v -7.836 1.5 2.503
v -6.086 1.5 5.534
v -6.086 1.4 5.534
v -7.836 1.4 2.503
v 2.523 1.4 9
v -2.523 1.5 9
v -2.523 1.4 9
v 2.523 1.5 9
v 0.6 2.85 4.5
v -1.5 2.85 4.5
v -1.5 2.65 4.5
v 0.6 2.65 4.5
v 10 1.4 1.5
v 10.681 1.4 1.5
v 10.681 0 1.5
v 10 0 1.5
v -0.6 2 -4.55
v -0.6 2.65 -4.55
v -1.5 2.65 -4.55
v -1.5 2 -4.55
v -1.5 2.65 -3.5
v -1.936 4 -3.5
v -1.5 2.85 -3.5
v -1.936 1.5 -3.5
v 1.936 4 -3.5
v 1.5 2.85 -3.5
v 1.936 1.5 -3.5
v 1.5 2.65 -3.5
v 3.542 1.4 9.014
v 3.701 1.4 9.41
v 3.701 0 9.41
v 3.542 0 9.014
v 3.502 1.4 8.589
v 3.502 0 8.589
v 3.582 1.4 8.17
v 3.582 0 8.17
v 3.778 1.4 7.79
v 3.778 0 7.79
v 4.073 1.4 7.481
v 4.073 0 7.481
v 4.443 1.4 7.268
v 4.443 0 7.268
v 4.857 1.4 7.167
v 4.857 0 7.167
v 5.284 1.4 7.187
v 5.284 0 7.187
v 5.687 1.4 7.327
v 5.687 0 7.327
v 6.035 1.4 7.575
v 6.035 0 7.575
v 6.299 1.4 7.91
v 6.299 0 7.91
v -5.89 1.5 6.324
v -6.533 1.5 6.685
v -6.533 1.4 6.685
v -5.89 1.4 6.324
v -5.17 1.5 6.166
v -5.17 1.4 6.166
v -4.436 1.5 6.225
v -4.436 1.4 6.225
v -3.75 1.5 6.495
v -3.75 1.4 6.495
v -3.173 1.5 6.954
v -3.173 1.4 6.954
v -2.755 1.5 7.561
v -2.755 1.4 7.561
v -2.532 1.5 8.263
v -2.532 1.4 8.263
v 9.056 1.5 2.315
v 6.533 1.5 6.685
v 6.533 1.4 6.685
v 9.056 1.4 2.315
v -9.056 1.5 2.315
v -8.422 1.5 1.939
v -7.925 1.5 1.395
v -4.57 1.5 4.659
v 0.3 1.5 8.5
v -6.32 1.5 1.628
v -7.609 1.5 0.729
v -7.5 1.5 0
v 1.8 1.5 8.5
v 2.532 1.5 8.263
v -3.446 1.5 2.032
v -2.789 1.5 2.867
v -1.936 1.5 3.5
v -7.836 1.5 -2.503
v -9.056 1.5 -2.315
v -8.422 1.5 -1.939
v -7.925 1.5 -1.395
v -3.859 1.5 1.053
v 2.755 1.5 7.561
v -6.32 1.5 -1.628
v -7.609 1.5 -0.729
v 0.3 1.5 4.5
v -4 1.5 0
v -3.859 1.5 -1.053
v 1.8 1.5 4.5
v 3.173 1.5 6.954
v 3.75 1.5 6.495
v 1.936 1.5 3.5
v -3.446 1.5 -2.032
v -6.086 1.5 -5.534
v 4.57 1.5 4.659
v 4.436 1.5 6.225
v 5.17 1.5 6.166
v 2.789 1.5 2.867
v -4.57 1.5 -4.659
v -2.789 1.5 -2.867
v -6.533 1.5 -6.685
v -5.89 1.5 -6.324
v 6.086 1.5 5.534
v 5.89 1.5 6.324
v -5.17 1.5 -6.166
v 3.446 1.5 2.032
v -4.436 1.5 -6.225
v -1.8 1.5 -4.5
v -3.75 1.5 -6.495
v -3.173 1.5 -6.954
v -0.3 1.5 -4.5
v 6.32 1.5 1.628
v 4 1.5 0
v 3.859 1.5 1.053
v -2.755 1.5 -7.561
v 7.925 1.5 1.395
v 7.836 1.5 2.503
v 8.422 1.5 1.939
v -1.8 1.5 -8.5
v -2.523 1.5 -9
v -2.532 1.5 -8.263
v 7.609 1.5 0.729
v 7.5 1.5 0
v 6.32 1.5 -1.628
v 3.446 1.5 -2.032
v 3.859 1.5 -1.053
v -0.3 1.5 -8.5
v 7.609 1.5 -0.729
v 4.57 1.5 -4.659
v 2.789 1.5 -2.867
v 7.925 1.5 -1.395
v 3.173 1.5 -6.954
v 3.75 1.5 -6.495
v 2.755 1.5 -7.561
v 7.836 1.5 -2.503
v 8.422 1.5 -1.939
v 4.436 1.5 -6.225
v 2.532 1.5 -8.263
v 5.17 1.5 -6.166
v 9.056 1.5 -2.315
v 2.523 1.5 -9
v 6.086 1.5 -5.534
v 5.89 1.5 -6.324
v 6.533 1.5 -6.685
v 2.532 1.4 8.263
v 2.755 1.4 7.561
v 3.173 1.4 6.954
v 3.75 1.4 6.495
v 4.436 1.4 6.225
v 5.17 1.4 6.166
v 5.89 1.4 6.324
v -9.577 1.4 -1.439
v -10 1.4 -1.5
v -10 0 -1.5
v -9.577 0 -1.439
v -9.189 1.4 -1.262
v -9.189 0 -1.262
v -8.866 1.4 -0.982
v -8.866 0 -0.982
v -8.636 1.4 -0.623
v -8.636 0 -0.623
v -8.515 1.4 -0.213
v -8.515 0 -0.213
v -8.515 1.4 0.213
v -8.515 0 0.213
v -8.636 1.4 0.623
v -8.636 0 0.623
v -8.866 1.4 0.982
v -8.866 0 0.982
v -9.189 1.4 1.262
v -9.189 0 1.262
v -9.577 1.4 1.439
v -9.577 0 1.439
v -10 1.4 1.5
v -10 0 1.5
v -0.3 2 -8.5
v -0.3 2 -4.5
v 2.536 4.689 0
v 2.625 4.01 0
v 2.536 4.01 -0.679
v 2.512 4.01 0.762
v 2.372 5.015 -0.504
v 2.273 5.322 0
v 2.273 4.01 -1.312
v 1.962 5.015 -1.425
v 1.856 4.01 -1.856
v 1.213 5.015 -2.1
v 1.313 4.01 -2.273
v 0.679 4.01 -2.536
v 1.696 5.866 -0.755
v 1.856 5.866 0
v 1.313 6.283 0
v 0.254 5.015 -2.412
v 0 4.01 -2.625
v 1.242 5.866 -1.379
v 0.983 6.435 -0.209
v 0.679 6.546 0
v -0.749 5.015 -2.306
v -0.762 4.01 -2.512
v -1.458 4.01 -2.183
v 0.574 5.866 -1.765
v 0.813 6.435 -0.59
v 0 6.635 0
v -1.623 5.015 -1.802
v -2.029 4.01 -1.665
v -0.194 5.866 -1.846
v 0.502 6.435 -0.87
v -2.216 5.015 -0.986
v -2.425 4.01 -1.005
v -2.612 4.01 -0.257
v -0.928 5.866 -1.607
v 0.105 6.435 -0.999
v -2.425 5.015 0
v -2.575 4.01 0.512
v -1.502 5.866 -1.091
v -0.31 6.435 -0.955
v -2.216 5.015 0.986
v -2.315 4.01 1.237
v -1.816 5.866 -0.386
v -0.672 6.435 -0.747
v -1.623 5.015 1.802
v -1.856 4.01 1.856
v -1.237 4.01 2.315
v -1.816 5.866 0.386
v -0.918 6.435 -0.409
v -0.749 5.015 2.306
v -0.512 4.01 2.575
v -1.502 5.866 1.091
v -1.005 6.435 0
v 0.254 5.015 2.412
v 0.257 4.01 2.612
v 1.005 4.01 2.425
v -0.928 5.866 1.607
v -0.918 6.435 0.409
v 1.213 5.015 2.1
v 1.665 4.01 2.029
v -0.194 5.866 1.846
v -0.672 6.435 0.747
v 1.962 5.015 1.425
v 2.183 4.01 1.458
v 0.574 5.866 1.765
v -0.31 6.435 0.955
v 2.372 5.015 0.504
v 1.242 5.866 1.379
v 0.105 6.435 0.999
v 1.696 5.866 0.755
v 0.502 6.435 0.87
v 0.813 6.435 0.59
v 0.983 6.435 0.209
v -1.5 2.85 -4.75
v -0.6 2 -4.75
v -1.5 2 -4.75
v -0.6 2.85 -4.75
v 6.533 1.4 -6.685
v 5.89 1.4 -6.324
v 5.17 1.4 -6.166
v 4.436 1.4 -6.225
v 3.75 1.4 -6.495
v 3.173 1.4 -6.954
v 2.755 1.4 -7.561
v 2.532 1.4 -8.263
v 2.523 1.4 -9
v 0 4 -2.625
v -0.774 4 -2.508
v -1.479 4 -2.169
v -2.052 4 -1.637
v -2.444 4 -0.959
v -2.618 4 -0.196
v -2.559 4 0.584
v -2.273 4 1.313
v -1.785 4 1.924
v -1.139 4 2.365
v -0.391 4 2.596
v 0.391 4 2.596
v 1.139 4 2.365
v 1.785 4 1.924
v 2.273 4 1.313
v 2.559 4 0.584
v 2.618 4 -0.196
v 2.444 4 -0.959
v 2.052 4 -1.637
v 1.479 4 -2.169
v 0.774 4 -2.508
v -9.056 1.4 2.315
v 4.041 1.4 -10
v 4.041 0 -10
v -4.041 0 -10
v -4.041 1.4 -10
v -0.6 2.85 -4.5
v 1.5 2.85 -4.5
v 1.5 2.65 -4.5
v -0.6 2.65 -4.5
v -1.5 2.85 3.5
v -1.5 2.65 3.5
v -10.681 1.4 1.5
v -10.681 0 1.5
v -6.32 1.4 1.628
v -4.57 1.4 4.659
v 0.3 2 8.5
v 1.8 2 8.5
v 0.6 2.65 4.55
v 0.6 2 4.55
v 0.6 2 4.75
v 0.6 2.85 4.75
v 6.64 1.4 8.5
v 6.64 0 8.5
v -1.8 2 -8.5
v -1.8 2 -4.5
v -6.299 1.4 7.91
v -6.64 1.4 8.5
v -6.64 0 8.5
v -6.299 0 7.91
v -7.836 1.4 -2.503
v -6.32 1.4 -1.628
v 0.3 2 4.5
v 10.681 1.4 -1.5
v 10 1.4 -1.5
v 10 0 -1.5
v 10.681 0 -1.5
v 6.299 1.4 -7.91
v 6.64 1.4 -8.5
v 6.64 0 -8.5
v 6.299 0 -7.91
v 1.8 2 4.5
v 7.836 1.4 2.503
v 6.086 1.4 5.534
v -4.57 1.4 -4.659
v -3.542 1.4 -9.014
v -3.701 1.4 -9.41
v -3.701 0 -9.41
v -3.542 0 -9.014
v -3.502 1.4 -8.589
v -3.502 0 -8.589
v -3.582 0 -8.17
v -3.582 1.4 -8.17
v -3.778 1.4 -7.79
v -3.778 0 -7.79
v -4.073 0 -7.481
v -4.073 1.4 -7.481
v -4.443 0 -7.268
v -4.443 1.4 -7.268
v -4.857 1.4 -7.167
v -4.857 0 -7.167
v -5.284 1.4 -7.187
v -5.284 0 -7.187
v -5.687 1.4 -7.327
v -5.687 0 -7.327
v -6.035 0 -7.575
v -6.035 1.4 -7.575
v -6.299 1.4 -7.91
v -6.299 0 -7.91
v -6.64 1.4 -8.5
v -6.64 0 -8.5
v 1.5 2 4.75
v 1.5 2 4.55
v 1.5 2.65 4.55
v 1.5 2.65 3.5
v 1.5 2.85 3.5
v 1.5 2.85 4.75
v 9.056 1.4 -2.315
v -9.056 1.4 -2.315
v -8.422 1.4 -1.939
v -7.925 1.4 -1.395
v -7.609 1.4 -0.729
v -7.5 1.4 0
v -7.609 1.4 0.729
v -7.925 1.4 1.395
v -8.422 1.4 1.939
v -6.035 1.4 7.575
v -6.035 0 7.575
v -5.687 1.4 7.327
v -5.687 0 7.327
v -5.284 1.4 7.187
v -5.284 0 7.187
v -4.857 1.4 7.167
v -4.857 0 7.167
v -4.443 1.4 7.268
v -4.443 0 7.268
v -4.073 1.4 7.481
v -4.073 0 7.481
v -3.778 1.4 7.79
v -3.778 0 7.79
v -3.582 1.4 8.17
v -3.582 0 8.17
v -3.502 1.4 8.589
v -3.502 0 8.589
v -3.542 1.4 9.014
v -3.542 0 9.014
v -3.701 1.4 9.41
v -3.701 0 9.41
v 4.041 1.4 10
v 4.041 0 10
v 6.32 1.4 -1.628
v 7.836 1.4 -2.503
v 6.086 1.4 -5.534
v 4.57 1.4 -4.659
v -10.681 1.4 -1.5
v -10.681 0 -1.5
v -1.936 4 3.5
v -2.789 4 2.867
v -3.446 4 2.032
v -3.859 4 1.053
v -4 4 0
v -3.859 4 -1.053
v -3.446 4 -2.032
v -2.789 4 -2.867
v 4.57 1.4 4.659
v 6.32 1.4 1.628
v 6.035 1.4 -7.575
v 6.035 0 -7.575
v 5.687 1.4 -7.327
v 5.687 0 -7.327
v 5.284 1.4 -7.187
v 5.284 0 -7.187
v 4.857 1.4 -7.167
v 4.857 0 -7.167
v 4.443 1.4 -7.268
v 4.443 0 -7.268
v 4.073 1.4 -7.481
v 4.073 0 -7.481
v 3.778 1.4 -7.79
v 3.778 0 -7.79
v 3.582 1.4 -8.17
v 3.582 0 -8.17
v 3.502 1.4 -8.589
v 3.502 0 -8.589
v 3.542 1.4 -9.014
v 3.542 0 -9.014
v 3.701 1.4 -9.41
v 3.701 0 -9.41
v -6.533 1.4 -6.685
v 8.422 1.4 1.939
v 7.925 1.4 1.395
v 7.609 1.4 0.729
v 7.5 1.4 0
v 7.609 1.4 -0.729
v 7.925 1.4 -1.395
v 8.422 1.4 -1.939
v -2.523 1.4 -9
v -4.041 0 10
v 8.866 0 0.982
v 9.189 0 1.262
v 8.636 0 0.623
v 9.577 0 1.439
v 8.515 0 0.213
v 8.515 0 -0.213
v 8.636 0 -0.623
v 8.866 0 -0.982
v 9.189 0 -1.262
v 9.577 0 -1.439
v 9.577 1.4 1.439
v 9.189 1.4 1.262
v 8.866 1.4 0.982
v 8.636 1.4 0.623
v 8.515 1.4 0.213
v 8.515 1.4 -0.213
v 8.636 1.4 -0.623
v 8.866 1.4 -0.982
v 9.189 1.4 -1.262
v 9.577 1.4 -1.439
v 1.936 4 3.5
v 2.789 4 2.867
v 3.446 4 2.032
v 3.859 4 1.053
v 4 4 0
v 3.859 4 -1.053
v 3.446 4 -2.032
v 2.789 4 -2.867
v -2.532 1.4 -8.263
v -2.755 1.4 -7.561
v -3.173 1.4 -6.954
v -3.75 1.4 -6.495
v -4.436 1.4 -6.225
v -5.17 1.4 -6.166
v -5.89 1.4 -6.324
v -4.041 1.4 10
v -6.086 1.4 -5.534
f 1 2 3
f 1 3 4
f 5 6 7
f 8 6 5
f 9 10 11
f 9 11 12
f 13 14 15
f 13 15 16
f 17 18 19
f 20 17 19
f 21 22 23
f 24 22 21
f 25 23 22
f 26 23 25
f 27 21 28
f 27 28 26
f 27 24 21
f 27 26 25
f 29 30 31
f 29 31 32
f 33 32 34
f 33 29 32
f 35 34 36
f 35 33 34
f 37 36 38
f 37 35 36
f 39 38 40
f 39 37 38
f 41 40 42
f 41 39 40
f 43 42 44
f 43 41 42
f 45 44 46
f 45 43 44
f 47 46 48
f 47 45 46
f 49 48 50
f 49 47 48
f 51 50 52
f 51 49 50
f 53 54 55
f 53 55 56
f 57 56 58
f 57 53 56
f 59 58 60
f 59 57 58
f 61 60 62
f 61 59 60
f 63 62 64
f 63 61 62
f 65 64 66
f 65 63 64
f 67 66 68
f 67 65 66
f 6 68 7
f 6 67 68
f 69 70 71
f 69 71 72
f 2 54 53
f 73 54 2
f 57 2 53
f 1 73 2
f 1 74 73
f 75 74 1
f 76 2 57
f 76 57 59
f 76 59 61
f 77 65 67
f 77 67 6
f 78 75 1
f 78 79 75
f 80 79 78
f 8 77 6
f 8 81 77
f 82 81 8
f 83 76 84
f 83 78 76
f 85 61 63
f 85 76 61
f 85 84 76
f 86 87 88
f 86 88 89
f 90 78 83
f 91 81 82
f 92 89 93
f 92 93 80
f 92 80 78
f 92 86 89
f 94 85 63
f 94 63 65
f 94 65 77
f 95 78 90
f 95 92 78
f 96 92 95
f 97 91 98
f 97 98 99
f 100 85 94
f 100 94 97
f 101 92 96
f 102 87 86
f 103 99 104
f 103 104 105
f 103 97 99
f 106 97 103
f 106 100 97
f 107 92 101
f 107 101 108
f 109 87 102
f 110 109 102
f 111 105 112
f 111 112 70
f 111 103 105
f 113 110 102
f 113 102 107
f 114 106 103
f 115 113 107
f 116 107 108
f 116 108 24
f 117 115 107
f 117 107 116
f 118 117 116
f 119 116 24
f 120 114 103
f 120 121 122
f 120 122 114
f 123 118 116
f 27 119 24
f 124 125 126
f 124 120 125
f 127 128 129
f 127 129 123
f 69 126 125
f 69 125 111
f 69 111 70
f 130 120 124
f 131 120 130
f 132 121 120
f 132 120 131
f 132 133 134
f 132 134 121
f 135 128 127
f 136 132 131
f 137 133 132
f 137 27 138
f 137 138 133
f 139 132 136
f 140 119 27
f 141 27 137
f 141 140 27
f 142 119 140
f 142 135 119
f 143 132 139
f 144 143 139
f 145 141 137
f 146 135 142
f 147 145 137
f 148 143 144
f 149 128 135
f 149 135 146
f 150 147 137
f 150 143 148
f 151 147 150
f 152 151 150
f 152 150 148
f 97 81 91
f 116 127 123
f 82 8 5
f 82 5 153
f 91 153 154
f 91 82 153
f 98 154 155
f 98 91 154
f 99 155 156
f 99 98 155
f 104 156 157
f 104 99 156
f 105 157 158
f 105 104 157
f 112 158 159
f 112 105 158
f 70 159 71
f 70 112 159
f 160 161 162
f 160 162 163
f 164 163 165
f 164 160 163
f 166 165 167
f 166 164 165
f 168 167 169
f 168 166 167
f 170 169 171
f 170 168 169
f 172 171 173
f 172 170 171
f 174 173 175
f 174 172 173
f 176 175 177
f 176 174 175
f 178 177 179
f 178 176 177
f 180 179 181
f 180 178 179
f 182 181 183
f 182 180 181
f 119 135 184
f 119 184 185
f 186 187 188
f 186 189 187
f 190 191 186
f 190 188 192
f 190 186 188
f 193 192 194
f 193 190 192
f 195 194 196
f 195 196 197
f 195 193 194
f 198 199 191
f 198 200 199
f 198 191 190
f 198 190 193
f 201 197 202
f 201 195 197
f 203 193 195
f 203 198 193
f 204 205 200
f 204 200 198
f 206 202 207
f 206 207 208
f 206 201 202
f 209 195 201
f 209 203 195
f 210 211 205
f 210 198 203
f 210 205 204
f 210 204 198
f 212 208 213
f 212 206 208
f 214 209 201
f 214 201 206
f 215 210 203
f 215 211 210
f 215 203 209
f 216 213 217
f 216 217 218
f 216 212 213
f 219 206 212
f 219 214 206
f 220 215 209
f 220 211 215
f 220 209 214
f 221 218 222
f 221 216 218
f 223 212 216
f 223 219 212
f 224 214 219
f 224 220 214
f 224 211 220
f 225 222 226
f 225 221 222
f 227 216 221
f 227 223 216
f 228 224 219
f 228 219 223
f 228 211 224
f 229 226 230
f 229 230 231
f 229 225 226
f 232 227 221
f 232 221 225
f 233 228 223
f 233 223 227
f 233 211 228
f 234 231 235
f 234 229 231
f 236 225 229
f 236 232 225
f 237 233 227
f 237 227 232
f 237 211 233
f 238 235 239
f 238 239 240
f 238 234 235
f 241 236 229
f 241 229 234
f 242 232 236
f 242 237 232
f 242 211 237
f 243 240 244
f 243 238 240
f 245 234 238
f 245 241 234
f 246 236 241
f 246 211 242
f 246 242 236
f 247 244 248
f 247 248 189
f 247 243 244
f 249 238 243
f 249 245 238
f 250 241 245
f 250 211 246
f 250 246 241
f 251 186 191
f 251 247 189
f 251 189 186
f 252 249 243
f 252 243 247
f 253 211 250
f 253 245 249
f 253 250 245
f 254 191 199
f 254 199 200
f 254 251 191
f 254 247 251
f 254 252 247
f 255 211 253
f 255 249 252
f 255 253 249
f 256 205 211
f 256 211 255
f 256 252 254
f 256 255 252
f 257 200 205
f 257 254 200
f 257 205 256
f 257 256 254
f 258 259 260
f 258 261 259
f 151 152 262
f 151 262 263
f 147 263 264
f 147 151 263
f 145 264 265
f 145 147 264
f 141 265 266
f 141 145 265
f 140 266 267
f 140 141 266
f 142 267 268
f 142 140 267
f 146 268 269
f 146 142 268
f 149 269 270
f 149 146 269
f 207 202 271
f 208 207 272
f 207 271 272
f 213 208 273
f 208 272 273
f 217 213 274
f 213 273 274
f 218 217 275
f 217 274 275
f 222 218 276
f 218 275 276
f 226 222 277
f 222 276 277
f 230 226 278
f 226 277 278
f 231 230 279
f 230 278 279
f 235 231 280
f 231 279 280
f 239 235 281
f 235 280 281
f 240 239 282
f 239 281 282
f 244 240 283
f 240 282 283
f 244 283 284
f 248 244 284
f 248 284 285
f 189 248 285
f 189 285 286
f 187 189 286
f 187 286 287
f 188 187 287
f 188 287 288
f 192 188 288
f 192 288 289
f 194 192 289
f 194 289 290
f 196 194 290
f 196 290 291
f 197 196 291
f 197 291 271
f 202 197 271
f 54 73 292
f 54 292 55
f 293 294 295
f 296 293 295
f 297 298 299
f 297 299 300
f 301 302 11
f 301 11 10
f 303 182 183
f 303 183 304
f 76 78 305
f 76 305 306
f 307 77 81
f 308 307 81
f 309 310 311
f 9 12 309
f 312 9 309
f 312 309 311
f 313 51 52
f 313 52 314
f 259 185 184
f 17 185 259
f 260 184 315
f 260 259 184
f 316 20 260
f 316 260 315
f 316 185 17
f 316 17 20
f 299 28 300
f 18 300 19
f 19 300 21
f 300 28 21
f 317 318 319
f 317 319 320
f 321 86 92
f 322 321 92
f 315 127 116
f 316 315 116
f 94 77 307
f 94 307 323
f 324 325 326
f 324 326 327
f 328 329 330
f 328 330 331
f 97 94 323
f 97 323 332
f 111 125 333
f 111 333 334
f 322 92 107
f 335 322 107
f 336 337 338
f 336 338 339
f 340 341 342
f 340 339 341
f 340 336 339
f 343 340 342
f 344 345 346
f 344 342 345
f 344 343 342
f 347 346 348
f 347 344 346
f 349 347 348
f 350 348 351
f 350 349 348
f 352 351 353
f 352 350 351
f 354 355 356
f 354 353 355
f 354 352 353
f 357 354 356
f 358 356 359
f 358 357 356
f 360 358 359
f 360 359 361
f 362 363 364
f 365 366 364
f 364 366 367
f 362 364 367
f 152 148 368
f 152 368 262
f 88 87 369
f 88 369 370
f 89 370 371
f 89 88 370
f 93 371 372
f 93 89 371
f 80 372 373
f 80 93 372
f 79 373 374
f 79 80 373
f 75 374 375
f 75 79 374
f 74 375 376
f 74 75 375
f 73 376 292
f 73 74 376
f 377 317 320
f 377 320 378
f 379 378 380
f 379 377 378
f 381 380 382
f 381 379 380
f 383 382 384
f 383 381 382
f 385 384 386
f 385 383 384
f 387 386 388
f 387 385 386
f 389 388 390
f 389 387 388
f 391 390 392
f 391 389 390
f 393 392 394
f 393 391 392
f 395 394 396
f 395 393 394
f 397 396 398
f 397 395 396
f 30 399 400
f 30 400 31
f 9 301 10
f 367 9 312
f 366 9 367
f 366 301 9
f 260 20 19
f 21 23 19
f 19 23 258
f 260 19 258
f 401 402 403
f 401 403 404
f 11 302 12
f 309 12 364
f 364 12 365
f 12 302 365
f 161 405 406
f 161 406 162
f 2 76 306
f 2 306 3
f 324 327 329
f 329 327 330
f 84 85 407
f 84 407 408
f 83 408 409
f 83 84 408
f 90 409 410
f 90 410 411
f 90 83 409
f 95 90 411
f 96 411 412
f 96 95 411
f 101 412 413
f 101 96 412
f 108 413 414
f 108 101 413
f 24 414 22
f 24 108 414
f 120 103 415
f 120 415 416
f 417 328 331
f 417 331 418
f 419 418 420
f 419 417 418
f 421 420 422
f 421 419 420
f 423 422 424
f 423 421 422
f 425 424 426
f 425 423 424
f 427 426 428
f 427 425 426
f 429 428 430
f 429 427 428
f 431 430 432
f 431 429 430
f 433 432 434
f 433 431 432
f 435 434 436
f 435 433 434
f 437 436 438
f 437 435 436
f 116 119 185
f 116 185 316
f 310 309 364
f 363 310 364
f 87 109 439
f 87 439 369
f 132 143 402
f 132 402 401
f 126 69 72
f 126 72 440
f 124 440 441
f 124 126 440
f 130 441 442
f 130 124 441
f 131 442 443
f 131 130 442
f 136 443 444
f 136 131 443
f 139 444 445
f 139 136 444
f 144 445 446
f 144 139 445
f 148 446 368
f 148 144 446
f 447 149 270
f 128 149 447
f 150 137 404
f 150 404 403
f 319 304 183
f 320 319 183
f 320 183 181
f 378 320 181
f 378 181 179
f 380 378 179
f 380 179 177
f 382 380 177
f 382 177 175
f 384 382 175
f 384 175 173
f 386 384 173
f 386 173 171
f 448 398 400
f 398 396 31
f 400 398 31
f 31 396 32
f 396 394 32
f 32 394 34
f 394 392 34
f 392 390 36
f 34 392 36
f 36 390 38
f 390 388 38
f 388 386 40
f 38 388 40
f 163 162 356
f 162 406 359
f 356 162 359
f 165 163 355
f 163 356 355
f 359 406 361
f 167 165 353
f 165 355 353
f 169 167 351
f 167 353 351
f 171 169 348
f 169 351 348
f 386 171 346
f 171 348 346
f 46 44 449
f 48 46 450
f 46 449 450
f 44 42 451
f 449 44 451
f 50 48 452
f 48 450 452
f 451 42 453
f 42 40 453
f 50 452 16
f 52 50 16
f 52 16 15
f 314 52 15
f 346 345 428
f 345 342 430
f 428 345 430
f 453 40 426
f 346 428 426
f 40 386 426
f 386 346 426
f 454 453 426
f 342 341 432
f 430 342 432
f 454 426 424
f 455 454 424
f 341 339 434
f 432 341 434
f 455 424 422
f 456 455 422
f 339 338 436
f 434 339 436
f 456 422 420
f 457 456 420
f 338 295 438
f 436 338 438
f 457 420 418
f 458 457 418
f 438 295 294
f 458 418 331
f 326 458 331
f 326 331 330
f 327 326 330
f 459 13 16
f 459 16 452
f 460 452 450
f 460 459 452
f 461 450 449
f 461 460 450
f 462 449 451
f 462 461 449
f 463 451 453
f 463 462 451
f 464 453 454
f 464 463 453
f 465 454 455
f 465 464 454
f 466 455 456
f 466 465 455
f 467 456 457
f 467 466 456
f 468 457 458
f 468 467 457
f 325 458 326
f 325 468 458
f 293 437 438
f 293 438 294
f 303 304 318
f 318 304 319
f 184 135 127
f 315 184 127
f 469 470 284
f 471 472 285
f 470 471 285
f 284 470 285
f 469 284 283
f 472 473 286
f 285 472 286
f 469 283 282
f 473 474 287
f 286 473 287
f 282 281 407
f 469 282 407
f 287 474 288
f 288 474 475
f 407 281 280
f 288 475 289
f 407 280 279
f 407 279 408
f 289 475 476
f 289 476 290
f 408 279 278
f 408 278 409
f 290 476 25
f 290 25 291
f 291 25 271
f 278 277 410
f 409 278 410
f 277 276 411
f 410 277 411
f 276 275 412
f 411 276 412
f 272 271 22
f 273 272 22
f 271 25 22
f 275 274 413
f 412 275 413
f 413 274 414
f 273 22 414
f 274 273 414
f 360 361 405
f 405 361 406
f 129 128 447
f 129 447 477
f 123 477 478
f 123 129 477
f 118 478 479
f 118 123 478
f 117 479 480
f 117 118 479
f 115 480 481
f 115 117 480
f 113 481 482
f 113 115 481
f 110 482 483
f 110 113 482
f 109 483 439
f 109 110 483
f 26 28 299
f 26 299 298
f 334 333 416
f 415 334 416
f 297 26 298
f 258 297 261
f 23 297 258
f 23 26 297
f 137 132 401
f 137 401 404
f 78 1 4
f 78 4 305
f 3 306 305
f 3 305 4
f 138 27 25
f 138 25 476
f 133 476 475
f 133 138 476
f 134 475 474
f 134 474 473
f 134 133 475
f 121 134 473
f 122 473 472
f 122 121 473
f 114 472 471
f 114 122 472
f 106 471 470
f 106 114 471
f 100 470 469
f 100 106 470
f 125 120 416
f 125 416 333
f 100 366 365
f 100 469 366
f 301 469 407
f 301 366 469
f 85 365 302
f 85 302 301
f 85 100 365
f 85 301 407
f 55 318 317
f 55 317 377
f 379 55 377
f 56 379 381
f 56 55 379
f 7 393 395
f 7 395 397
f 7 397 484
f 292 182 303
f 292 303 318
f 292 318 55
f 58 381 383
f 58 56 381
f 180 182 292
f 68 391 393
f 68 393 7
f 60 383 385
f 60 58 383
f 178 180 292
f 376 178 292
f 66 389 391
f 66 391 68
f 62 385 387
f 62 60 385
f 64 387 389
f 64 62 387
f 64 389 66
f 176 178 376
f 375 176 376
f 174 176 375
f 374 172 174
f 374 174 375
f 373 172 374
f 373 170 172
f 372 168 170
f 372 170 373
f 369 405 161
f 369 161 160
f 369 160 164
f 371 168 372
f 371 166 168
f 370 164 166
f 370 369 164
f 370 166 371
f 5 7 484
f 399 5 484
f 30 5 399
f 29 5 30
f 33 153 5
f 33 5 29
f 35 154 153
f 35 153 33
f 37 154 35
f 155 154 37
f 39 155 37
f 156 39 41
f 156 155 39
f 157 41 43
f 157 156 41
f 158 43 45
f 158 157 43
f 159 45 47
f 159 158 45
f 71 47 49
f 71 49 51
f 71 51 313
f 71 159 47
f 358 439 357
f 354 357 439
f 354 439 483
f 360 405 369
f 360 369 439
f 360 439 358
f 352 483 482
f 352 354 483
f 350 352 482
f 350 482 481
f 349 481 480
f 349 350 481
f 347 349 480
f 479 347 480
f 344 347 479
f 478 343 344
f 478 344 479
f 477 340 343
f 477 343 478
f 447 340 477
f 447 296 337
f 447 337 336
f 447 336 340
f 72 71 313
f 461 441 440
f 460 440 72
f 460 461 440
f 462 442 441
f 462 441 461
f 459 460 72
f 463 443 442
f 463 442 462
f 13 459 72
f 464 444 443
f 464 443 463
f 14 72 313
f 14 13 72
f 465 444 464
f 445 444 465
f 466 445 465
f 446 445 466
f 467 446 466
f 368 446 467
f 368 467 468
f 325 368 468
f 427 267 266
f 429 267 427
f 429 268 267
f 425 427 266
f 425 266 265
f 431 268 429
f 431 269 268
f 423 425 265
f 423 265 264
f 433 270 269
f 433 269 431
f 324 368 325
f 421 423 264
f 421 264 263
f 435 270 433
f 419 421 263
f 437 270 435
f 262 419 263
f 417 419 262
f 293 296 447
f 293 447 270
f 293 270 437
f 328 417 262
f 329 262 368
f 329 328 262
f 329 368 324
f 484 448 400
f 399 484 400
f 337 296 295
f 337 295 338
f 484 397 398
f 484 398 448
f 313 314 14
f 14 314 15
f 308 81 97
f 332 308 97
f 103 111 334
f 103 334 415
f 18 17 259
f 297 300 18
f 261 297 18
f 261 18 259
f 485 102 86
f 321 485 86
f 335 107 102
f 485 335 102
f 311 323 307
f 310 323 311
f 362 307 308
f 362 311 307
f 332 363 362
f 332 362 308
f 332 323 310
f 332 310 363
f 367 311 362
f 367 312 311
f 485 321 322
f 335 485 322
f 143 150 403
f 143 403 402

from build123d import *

# Parameters (mm, degrees)
BOSS_EXTRUDE1_DEPTH = 1.5
BOSS_EXTRUDE2_DEPTH = 2.5
SKETCH3_R           = 2.625
BOSS_EXTRUDE3_DEPTH = 0.01
SKETCH4_W           = 3
SKETCH4_H           = 0.2
BOSS_EXTRUDE4_DEPTH = 1
SKETCH5_W           = 0.9
SKETCH5_H           = 0.2
BOSS_EXTRUDE5_DEPTH = 0.25
BOSS_EXTRUDE6_REACH = 17.786
SKETCH6_W           = 0.9
SKETCH6_H           = 0.2
SKETCH8_W           = 1.5
SKETCH8_H           = 4
BOSS_EXTRUDE7_DEPTH = 0.5
CIRPATTERN1_COUNT   = 2
CUT_EXTRUDE1_DEPTH  = 17.115258556
CIRPATTERN2_COUNT   = 6
CUT_EXTRUDE2_DEPTH  = 0.1


# Read off the part's stored shape, not the designer's step: Dome1
with BuildPart() as part:
    # Sketch1 → Boss-Extrude1 (new body)
    with BuildSketch(Plane(origin=(0, 0, 0), x_dir=(1, 0, 0), z_dir=(0, 1, 0))):
        Polygon((-11.547005384, 0), (-5.773502692, -10), (5.773502692, -10), (11.547005384, 0), (5.773502692, 10), (-5.773502692, 10), align=None)
    extrude(amount=BOSS_EXTRUDE1_DEPTH)

    # Sketch2 → Boss-Extrude2 (add)
    with BuildSketch(Plane(origin=(0, 1.5, 0), x_dir=(1, 0, 0), z_dir=(0, 1, 0))):
        with BuildLine():
            Line((-1.936491673, 3.5), (1.936491673, 3.5))
            ThreePointArc((1.936491673, 3.5), (4, 0), (1.936491673, -3.5))
            Line((1.936491673, -3.5), (-1.936491673, -3.5))
            ThreePointArc((-1.936491673, -3.5), (-4, 0), (-1.936491673, 3.5))
        make_face()
    extrude(amount=BOSS_EXTRUDE2_DEPTH)

    # Sketch3 → Boss-Extrude3 (add)
    with BuildSketch(Plane(origin=(0, 4, 0), x_dir=(1, 0, 0), z_dir=(0, 1, 0))):
        with Locations(Location((0, 0, 0), (0, 0, 90))):
            Circle(SKETCH3_R)
    extrude(amount=BOSS_EXTRUDE3_DEPTH)

    # Dome1 outline → Dome1 (revolve)
    with BuildSketch(Plane.XY):
        with BuildLine():
            Line((0, 4.01), (2.625, 4.009999997))
            ThreePointArc((2.625, 4.009999997), (1.856155302, 5.8661553), (0, 6.635))
            Line((0, 6.635), (0, 4.01))
        make_face()
    revolve(axis=Axis((0, 0, 0), (0, 1, 0)))

    # Sketch4 → Boss-Extrude4 (add)
    with BuildSketch(Plane.XY.offset(3.5)):
        with Locations((0, 2.75)):
            Rectangle(SKETCH4_W, SKETCH4_H)
    boss_extrude4 = extrude(amount=BOSS_EXTRUDE4_DEPTH)

    # Sketch5 → Boss-Extrude5 (add)
    with BuildSketch(Plane.XY.offset(4.5)):
        with Locations((1.05, 2.75)):
            Rectangle(SKETCH5_W, SKETCH5_H)
    boss_extrude5 = extrude(amount=BOSS_EXTRUDE5_DEPTH)

    # Sketch6 → Boss-Extrude6 (add, up to next)
    with BuildSketch(Plane.XZ.offset(-2.65), mode=Mode.PRIVATE) as boss_extrude6_sk1:
        with Locations((1.05, 4.65)):
            Rectangle(SKETCH6_W, SKETCH6_H)
    boss_extrude6_tool1 = extrude(boss_extrude6_sk1.sketch, amount=BOSS_EXTRUDE6_REACH, mode=Mode.PRIVATE) - part.part
    boss_extrude6 = boss_extrude6_tool1.solids().sort_by_distance((1.05, 2.65, 4.65))[0]
    add(boss_extrude6)

    # Sketch8 → Boss-Extrude7 (add)
    with BuildSketch(Plane(origin=(0, 1.5, 0), x_dir=(1, 0, 0), z_dir=(0, 1, 0))):
        with Locations((1.05, -6.5)):
            Rectangle(SKETCH8_W, SKETCH8_H)
    boss_extrude7 = extrude(amount=BOSS_EXTRUDE7_DEPTH)

    # CirPattern1: Boss-Extrude4, Boss-Extrude5, Boss-Extrude6, Boss-Extrude7 ×2 about axis
    cirpattern1_axis = Axis((0, 0, 0), (0, 1, 0))
    add([boss_extrude4.rotate(cirpattern1_axis, i * 360 / CIRPATTERN1_COUNT) for i in range(1, CIRPATTERN1_COUNT)])
    add([boss_extrude5.rotate(cirpattern1_axis, i * 360 / CIRPATTERN1_COUNT) for i in range(1, CIRPATTERN1_COUNT)])
    add([boss_extrude6.rotate(cirpattern1_axis, i * 360 / CIRPATTERN1_COUNT) for i in range(1, CIRPATTERN1_COUNT)])
    add([boss_extrude7.rotate(cirpattern1_axis, i * 360 / CIRPATTERN1_COUNT) for i in range(1, CIRPATTERN1_COUNT)])

    # Sketch9 → Cut-Extrude1 (cut, through all)
    with BuildSketch(Plane(origin=(0, 1.5, 0), x_dir=(1, 0, 0), z_dir=(0, 1, 0))):
        with BuildLine():
            Line((-6.200961894, 13.740381057), (-3.700961894, 9.410254038))
            ThreePointArc((-3.700961894, 9.410254038), (-4.25, 7.361215932), (-6.299038106, 7.910254038))
            Line((-6.299038106, 7.910254038), (-8.799038106, 12.240381057))
            ThreePointArc((-8.799038106, 12.240381057), (-8.25, 14.289419162), (-6.200961894, 13.740381057))
        make_face()
    cut_extrude1 = extrude(amount=-CUT_EXTRUDE1_DEPTH, mode=Mode.SUBTRACT)

    # CirPattern2: Cut-Extrude1 ×6 about axis
    cirpattern2_axis = Axis((0, 0, 0), (0, 1, 0))
    for i in range(1, CIRPATTERN2_COUNT):
        add(cut_extrude1.rotate(cirpattern2_axis, i * 360 / CIRPATTERN2_COUNT), mode=Mode.SUBTRACT)

    # Sketch10 → Cut-Extrude2 (cut)
    # profile 1 of 5: a face of its own
    with BuildSketch(Plane(origin=(0, 1.5, 0), x_dir=(1, 0, 0), z_dir=(0, 1, 0))):
        with BuildLine():
            Line((-6.639528096, 8.5), (-10.68097998, 1.5))
            Line((-10.68097998, 1.5), (-10, 1.5))
            ThreePointArc((-10, 1.5), (-8.5, 0), (-10, -1.5))
            Line((-10, -1.5), (-10.68097998, -1.5))
            Line((-10.68097998, -1.5), (-6.639528096, -8.5))
            Line((-6.639528096, -8.5), (-6.299038106, -7.910254038))
            ThreePointArc((-6.299038106, -7.910254038), (-4.25, -7.361215932), (-3.700961894, -9.410254038))
            Line((-3.700961894, -9.410254038), (-4.041451884, -10))
            Line((-4.041451884, -10), (4.041451884, -10))
            Line((4.041451884, -10), (3.700961894, -9.410254038))
            ThreePointArc((3.700961894, -9.410254038), (4.25, -7.361215932), (6.299038106, -7.910254038))
            Line((6.299038106, -7.910254038), (6.639528096, -8.5))
            Line((6.639528096, -8.5), (10.68097998, -1.5))
            Line((10.68097998, -1.5), (10, -1.5))
            ThreePointArc((10, -1.5), (8.5, 0), (10, 1.5))
            Line((10, 1.5), (10.68097998, 1.5))
            Line((10.68097998, 1.5), (6.639528096, 8.5))
            Line((6.639528096, 8.5), (6.299038106, 7.910254038))
            ThreePointArc((6.299038106, 7.910254038), (4.25, 7.361215932), (3.700961894, 9.410254038))
            Line((3.700961894, 9.410254038), (4.041451884, 10))
            Line((4.041451884, 10), (-4.041451884, 10))
            Line((-4.041451884, 10), (-3.700961894, 9.410254038))
            ThreePointArc((-3.700961894, 9.410254038), (-4.25, 7.361215932), (-6.299038106, 7.910254038))
            Line((-6.299038106, 7.910254038), (-6.639528096, 8.5))
        make_face()
        with BuildLine():
            ThreePointArc((-2.523193047, 9), (-3.75, 6.495190528), (-6.53263211, 6.685149278))
            Line((-6.53263211, 6.685149278), (-9.055825158, 2.314850722))
            ThreePointArc((-9.055825158, 2.314850722), (-7.5, 0), (-9.055825158, -2.314850722))
            Line((-9.055825158, -2.314850722), (-6.53263211, -6.685149278))
            ThreePointArc((-6.53263211, -6.685149278), (-3.75, -6.495190528), (-2.523193047, -9))
            Line((-2.523193047, -9), (2.523193047, -9))
            ThreePointArc((2.523193047, -9), (3.75, -6.495190528), (6.53263211, -6.685149278))
            Line((6.53263211, -6.685149278), (9.055825158, -2.314850722))
            ThreePointArc((9.055825158, -2.314850722), (7.5, 0), (9.055825158, 2.314850722))
            Line((9.055825158, 2.314850722), (6.53263211, 6.685149278))
            ThreePointArc((6.53263211, 6.685149278), (3.75, 6.495190528), (2.523193047, 9))
            Line((2.523193047, 9), (-2.523193047, 9))
        make_face(mode=Mode.SUBTRACT)
    # profile 2 of 5: a face of its own
    with BuildSketch(Plane(origin=(0, 1.5, 0), x_dir=(1, 0, 0), z_dir=(0, 1, 0))):
        Polygon((-7.835723618, 2.503231198), (-6.320179161, 1.628231198), (-4.570179161, 4.659320111), (-6.085723618, 5.534320111), align=None)
    # profile 3 of 5: a face of its own
    with BuildSketch(Plane(origin=(0, 1.5, 0), x_dir=(1, 0, 0), z_dir=(0, 1, 0))):
        Polygon((-6.320179161, -1.628231198), (-4.570179161, -4.659320111), (-6.085723618, -5.534320111), (-7.835723618, -2.503231198), align=None)
    # profile 4 of 5: a face of its own
    with BuildSketch(Plane(origin=(0, 1.5, 0), x_dir=(1, 0, 0), z_dir=(0, 1, 0))):
        Polygon((7.835723618, -2.503231198), (6.085723618, -5.534320111), (4.570179161, -4.659320111), (6.320179161, -1.628231198), align=None)
    # profile 5 of 5: a face of its own
    with BuildSketch(Plane(origin=(0, 1.5, 0), x_dir=(1, 0, 0), z_dir=(0, 1, 0))):
        Polygon((7.835723618, 2.503231198), (6.320179161, 1.628231198), (4.570179161, 4.659320111), (6.085723618, 5.534320111), align=None)
    extrude(amount=-CUT_EXTRUDE2_DEPTH, mode=Mode.SUBTRACT)


solid = part.part
